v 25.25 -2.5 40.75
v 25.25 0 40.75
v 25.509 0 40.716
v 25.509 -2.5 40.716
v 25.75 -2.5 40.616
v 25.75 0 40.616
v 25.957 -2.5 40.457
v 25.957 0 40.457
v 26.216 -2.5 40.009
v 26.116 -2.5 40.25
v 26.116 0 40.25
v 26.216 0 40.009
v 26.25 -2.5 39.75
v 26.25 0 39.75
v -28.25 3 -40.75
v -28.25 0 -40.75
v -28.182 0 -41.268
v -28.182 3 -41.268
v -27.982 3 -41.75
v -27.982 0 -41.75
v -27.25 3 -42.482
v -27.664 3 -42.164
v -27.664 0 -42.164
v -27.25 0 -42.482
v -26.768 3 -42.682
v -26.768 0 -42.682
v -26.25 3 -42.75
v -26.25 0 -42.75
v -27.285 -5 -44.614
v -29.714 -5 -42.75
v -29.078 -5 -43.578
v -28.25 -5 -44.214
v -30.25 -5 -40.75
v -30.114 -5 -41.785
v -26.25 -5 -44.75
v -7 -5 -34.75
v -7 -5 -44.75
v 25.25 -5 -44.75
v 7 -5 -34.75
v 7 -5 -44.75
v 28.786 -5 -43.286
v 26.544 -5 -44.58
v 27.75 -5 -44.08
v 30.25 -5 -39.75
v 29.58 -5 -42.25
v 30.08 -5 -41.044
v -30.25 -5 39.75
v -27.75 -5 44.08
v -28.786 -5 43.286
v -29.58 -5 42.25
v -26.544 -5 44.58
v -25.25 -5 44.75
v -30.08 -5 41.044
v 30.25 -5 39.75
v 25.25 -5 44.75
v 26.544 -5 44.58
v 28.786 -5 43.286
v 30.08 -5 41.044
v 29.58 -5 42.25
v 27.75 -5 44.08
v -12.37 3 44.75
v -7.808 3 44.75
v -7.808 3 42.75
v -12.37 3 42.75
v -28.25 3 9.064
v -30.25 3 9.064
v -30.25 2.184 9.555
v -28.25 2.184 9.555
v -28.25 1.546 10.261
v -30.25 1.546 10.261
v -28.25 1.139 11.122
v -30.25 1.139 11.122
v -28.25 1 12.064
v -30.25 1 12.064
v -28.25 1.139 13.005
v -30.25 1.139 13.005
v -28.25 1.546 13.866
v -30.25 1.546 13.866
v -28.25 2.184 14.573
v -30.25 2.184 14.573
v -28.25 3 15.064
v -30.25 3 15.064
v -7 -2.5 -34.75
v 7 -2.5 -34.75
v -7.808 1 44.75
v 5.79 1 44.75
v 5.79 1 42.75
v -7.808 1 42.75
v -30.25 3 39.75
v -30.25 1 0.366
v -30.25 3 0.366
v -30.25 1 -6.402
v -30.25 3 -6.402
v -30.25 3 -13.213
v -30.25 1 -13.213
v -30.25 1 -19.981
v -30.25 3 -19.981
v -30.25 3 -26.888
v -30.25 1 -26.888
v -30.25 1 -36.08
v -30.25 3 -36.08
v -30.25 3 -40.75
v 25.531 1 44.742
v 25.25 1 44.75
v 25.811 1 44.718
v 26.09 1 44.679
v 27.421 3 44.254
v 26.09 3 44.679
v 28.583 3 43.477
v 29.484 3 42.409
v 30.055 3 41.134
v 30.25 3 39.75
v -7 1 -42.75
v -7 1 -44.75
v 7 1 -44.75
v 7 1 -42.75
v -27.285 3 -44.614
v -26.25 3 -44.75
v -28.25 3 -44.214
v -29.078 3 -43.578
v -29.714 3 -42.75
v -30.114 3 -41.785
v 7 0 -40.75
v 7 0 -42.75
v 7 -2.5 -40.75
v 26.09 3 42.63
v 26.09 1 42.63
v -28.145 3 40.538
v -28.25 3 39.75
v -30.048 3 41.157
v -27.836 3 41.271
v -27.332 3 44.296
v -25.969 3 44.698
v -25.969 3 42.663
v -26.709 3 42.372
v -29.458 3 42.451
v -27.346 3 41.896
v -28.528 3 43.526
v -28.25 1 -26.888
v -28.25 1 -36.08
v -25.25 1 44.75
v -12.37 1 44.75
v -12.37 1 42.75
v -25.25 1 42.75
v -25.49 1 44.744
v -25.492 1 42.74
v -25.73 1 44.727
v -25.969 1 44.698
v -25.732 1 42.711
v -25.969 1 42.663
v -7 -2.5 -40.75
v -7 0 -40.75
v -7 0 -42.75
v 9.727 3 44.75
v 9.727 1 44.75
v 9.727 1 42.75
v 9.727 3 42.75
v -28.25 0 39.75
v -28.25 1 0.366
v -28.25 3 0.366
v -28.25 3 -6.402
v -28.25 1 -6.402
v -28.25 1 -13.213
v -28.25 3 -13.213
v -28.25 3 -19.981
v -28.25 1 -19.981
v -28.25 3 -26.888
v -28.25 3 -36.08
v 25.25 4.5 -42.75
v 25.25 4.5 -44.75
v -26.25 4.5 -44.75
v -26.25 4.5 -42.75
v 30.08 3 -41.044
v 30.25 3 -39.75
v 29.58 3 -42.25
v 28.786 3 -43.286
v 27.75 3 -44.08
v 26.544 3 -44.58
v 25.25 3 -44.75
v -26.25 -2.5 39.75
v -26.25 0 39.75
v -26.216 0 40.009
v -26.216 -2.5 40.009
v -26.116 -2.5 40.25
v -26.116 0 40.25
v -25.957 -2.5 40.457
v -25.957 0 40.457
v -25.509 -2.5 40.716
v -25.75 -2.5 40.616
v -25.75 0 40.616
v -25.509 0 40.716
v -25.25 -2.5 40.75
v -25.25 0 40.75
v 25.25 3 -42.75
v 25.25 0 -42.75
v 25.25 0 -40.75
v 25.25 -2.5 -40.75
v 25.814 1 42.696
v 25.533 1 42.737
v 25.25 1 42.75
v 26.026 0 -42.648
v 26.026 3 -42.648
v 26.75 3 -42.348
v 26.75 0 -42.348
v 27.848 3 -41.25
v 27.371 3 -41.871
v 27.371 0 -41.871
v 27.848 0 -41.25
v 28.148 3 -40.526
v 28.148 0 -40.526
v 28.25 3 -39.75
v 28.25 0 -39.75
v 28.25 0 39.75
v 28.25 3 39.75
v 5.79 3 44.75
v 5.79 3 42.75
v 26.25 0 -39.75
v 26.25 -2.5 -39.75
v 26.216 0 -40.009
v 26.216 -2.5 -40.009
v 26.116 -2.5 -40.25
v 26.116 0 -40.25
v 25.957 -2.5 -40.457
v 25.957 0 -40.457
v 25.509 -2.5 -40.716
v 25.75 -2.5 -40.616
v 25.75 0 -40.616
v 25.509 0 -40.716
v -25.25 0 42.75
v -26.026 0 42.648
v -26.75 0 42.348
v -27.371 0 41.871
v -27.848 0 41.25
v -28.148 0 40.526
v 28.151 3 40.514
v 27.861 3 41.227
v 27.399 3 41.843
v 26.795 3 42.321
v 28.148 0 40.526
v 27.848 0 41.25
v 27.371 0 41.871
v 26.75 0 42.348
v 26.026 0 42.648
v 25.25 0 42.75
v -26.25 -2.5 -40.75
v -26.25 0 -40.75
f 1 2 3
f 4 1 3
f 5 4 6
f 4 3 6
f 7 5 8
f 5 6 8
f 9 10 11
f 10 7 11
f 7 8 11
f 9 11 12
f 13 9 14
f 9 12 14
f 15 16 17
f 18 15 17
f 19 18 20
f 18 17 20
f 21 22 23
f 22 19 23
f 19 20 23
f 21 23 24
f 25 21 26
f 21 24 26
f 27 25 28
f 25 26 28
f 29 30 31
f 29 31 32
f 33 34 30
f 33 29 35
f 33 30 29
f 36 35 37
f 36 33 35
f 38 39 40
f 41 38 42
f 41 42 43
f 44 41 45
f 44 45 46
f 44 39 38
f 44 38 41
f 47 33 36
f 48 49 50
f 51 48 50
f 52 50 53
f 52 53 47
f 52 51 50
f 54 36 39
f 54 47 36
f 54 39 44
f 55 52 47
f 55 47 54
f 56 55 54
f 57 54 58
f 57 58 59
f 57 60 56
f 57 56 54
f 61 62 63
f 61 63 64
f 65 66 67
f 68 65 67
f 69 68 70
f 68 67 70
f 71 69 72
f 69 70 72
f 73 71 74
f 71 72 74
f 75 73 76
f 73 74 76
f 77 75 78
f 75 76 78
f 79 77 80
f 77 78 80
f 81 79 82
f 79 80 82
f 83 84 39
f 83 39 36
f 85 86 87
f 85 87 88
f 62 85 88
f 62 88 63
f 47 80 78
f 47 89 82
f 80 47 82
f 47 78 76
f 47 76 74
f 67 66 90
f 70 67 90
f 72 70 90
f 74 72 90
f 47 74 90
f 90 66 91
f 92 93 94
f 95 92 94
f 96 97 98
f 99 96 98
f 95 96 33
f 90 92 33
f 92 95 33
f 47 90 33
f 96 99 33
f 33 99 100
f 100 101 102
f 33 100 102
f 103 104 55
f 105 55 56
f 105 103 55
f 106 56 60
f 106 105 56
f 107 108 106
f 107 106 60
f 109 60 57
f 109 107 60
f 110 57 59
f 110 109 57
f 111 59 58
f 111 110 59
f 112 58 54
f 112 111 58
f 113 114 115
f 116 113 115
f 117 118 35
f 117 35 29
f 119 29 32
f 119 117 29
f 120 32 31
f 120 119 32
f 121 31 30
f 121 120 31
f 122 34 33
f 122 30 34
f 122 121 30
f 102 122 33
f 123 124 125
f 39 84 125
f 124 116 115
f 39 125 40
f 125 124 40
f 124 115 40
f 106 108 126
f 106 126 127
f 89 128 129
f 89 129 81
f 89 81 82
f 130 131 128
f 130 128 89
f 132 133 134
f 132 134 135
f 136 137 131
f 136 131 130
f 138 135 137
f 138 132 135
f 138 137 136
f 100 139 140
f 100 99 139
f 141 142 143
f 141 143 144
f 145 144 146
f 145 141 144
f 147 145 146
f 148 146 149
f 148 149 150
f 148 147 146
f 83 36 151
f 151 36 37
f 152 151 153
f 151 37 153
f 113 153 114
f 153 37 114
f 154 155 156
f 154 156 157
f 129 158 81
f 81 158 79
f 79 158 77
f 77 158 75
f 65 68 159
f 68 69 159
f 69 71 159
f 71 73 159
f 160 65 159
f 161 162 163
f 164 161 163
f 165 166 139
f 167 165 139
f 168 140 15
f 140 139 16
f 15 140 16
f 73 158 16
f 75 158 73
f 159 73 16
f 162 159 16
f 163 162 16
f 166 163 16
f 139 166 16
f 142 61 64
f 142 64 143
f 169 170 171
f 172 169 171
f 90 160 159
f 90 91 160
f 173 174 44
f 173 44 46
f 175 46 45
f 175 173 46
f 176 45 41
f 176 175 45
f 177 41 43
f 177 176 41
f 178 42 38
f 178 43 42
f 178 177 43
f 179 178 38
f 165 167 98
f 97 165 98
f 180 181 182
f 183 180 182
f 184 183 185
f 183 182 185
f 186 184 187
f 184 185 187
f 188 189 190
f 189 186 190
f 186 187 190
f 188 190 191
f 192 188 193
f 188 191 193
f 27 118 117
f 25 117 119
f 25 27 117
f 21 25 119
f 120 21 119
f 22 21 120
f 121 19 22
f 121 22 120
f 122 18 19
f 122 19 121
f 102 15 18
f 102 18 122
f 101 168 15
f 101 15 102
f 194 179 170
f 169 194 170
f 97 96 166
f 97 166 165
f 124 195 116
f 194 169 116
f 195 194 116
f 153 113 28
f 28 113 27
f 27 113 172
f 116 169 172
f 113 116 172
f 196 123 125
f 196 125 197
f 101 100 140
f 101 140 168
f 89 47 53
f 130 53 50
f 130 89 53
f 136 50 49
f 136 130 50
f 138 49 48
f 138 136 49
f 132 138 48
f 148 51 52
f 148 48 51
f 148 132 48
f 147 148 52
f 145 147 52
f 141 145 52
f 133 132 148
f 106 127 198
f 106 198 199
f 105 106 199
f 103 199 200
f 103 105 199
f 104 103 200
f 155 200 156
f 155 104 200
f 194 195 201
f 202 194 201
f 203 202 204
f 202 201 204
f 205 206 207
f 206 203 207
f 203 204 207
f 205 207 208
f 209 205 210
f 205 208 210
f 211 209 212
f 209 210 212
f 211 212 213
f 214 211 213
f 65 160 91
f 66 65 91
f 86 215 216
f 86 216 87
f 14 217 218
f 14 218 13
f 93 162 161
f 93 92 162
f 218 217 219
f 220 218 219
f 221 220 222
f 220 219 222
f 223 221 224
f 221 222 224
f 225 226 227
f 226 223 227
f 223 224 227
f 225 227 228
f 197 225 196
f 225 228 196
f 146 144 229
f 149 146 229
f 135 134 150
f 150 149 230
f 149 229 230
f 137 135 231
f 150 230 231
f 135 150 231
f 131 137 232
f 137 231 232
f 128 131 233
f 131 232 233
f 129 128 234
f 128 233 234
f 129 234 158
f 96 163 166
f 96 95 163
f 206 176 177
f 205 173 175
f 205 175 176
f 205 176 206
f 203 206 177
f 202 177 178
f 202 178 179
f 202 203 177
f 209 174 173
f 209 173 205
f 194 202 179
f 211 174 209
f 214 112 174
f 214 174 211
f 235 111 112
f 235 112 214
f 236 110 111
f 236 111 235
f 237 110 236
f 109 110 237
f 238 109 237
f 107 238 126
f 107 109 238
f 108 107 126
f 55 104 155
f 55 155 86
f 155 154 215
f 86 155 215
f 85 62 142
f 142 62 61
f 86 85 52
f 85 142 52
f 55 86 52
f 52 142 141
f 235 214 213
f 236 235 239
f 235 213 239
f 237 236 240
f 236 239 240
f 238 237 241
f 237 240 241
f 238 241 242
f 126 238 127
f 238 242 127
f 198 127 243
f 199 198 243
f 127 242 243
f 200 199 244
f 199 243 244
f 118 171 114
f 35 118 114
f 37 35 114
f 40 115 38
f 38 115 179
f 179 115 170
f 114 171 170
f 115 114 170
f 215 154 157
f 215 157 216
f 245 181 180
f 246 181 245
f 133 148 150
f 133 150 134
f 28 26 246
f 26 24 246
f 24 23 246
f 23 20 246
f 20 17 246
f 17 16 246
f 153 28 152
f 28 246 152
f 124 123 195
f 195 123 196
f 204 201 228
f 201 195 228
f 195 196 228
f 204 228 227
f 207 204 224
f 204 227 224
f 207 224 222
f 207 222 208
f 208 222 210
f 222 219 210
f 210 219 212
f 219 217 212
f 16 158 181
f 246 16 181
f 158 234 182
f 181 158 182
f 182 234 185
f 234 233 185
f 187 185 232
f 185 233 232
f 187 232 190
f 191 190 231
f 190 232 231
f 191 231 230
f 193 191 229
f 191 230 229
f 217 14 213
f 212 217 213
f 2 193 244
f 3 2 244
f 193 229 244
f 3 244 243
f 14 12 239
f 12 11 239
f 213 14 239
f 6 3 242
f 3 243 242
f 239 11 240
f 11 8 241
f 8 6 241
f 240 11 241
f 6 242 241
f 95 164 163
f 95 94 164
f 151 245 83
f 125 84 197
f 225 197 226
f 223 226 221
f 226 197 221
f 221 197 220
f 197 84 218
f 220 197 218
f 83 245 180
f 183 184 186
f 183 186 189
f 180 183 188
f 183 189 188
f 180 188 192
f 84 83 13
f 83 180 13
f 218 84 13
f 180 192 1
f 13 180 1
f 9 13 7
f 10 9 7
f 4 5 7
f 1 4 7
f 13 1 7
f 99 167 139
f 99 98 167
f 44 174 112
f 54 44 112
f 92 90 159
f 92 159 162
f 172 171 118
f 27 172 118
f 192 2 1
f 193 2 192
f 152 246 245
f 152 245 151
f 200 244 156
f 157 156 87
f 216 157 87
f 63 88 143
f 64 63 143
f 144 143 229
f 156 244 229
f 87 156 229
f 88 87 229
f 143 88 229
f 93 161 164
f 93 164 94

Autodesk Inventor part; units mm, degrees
ref_plane "YZ Plane" through (0, 0, 0) normal (1, 0, 0) x (0, 1, 0)
ref_plane "XZ Plane" through (0, 0, 0) normal (0, 1, 0) x (-1, 0, 0)
ref_plane "XY Plane" through (0, 0, 0) normal (0, 0, 1) x (1, 0, 0)
sketch "Sketch1" plane through (0, 0, 0) normal (0, 1, 0) x (-1, 0, 0)
  line L0 (-25.25, 42.75) -> (25.25, 42.75)
  line L1 (28.25, 39.75) -> (28.25, -40.75)
  line L2 (26.25, -42.75) -> (-25.25, -42.75)
  line L3 (-28.25, -39.75) -> (-28.25, 39.75)
  line L4 (-28.25, 42.75) -> (28.25, -42.75) construction
  line L5 (28.25, 42.75) -> (-28.25, -42.75) construction
  arc A0 (26.25, -42.75) -> (28.25, -40.75) centre (26.25, -40.75) ccw
  arc A1 (-28.25, -39.75) -> (-25.25, -42.75) centre (-25.25, -39.75) ccw
  arc A2 (-25.25, 42.75) -> (-28.25, 39.75) centre (-25.25, 39.75) ccw
  arc A3 (28.25, 39.75) -> (25.25, 42.75) centre (25.25, 39.75) ccw
  line L6 (30.25, -40.75) -> (30.25, 39.75)
  arc A4 (30.25, 39.75) -> (25.25, 44.75) centre (25.25, 39.75) ccw
  line L7 (25.25, 44.75) -> (-25.25, 44.75)
  arc A5 (-25.25, 44.75) -> (-30.25, 39.75) centre (-25.25, 39.75) ccw
  line L8 (-30.25, 39.75) -> (-30.25, -39.75)
  arc A6 (-30.25, -39.75) -> (-25.25, -44.75) centre (-25.25, -39.75) ccw
  line L9 (-25.25, -44.75) -> (26.25, -44.75)
  arc A7 (26.25, -44.75) -> (30.25, -40.75) centre (26.25, -40.75) ccw
  point P0 (0, 0)
  dimension "d0" = 56.5
  dimension "d1" = 85.5
  dimension "d2" = 2
  dimension "d3" = 3
  dimension "d4" = 2
extrude "Extrusion1" add sketch "Sketch1" along normal blind 3
sketch "Sketch2" plane through (0, 0, 0) normal (0, -1, 0) x (1, 0, 0)
  arc A0 (-25.25, 44.75) -> (-30.25, 39.75) centre (-25.25, 39.75) ccw projected
  line L0 (-25.25, 44.75) -> (25.25, 44.75) projected
  arc A1 (30.25, 39.75) -> (25.25, 44.75) centre (25.25, 39.75) ccw projected
  line L1 (30.25, 39.75) -> (30.25, -39.75) projected
  arc A2 (25.25, -44.75) -> (30.25, -39.75) centre (25.25, -39.75) ccw projected
  line L2 (25.25, -44.75) -> (-26.25, -44.75) projected
  arc A3 (-30.25, -40.75) -> (-26.25, -44.75) centre (-26.25, -40.75) ccw projected
  line L3 (-30.25, -40.75) -> (-30.25, 39.75) projected
  line L4 (-26.25, -44.75) -> (25.25, -44.75)
  line L5 (30.25, -39.75) -> (30.25, 39.75)
  line L6 (25.25, 44.75) -> (-25.25, 44.75)
  line L7 (-30.25, 39.75) -> (-30.25, -40.75)
  line L8 (-30, -44.5) -> (30, 44.5) construction
  line L9 (30, -44.5) -> (-30, 44.5) construction
  arc A4 (-25.25, 44.75) -> (-30.25, 39.75) centre (-25.25, 39.75) ccw
  arc A5 (30.25, 39.75) -> (25.25, 44.75) centre (25.25, 39.75) ccw
  arc A6 (25.25, -42.75) -> (28.25, -39.75) centre (25.25, -39.75) ccw projected
  arc A7 (25.25, -44.75) -> (30.25, -39.75) centre (25.25, -39.75) ccw
  arc A8 (-30.25, -40.75) -> (-26.25, -44.75) centre (-26.25, -40.75) ccw
  line L10 (25.25, 40.75) -> (-25.25, 40.75)
  arc A9 (-25.25, 40.75) -> (-26.25, 39.75) centre (-25.25, 39.75) ccw
  line L11 (-26.25, 39.75) -> (-26.25, -40.75)
  line L12 (-26.25, -40.75) -> (25.25, -40.75)
  arc A10 (25.25, -40.75) -> (26.25, -39.75) centre (25.25, -39.75) ccw
  line L13 (26.25, -39.75) -> (26.25, 39.75)
  arc A11 (26.25, 39.75) -> (25.25, 40.75) centre (25.25, 39.75) ccw
  point P0 (0, 0)
  point P1 (-26.25, -40.75)
  dimension "d12" = 4
extrude "Extrusion2" add sketch "Sketch2" along normal blind 2.5
sketch "Sketch3" plane through (25.25, 3, -44.75) normal (0, 0, -1) x (-1, 0, 0)
  line L0 (51.5, -5.5) -> (51.5, 0) projected
  line L1 (51.5, 0) -> (0, 0)
  line L2 (0, 0) -> (0, 1.5)
  line L3 (0, 1.5) -> (51.5, 1.5)
  line L4 (51.5, 1.5) -> (51.5, 0)
  point P0 (25.25, -3)
  dimension "d9" = 1.5
extrude "Extrusion3" add sketch "Sketch3" against normal blind 2
sketch "Sketch4" plane through (0, -2.5, 0) normal (0, -1, 0) x (1, 0, 0)
  line L0 (25.25, 44.75) -> (-25.25, 44.75)
  line L1 (-30.25, 39.75) -> (-30.25, -40.75)
  line L2 (-26.25, -44.75) -> (25.25, -44.75)
  line L3 (30.25, -39.75) -> (30.25, 39.75)
  line L4 (30, 44.5) -> (-30, -44.5) construction
  line L5 (-30, 44.5) -> (30, -44.5) construction
  line L6 (-26.25, -44.75) -> (25.25, -44.75) projected
  line L7 (-30.25, 39.75) -> (-30.25, -40.75) projected
  arc A0 (25.25, -44.75) -> (30.25, -39.75) centre (25.25, -39.75) ccw projected
  arc A1 (-30.25, -40.75) -> (-26.25, -44.75) centre (-26.25, -40.75) ccw projected
  arc A2 (-25.25, 44.75) -> (-30.25, 39.75) centre (-25.25, 39.75) ccw projected
  arc A3 (30.25, 39.75) -> (25.25, 44.75) centre (25.25, 39.75) ccw projected
  arc A4 (25.25, -44.75) -> (30.25, -39.75) centre (25.25, -39.75) ccw
  line L8 (25.25, -40.75) -> (-26.25, -40.75) projected
  arc A5 (-30.25, -40.75) -> (-26.25, -44.75) centre (-26.25, -40.75) ccw
  arc A6 (-25.25, 44.75) -> (-30.25, 39.75) centre (-25.25, 39.75) ccw
  arc A7 (30.25, 39.75) -> (25.25, 44.75) centre (25.25, 39.75) ccw
  line L9 (25.25, 44.75) -> (-25.25, 44.75) projected
  point P0 (0, 0)
  point P1 (-30.25, 39.75)
  point P2 (-30.25, -40.75)
  point P3 (25.25, -44.75)
extrude "Extrusion4" add sketch "Sketch4" along normal blind 2.5
sketch "Sketch5" plane through (25.25, 4.5, -44.75) normal (0, 0, -1) x (-1, 0, 0)
  line L0 (51.5, -9.5) -> (0, -9.5) projected
  line L1 (18.25, -9.5) -> (32.25, -9.5)
  line L2 (32.25, -9.5) -> (32.25, -3.5)
  line L3 (32.25, -3.5) -> (18.25, -3.5)
  line L4 (18.25, -3.5) -> (18.25, -9.5)
  line L5 (18.25, -9.5) -> (32.25, -3.5) construction
  line L6 (32.25, -9.5) -> (18.25, -3.5) construction
  point P0 (25.25, -4.5)
  point P1 (25.25, -6.5)
  dimension "d16" = 14
  dimension "d17" = 0
  dimension "d18" = 6
extrude "Extrusion5" cut sketch "Sketch5" against normal blind 10
sketch "Sketch6" plane through (-30.25, 3, -40.75) normal (-1, 0, 0) x (0, 0, 1)
  line L0 (1, 0) -> (80.5, 0) projected
  line L1 (4.6696, 0) -> (13.8622, 0)
  line L2 (13.8622, 0) -> (13.8622, -2)
  line L3 (13.8622, -2) -> (4.6696, -2)
  line L4 (4.6696, -2) -> (4.6696, 0)
  line L5 (20.7687, 0) -> (27.5371, 0)
  line L6 (27.5371, 0) -> (27.5371, -2)
  line L7 (27.5371, -2) -> (20.7687, -2)
  line L8 (20.7687, -2) -> (20.7687, 0)
  line L9 (34.3481, 0) -> (41.1165, 0)
  line L10 (41.1165, 0) -> (41.1165, -2)
  line L11 (41.1165, -2) -> (34.3481, -2)
  line L12 (34.3481, -2) -> (34.3481, 0)
  arc A0 (49.8136, 0) -> (55.8136, 0) centre (52.8136, 1.25) ccw
  line L13 (-2, 1.5) -> (-2, 0) projected
  line L14 (80.5, -8) -> (0, -8) projected
  line L15 (49.8136, 0) -> (55.8136, 0)
  point P0 (40.75, -3)
  dimension "d21" = 6.6696
  dimension "d22" = 9.1926
  dimension "d23" = 22.7687
  dimension "d25" = 6.7684
  dimension "d26" = 6.7684
  dimension "d27" = 36.3481
  dimension "d28" = 51.8136
  dimension "d29" = 6
  dimension "d30" = 2
extrude "Extrusion6" cut sketch "Sketch6" against normal up to surface (2 mm away)
sketch "Sketch7" plane through (-25.25, 3, 44.75) normal (0, 0, 1) x (1, 0, 0)
  line L0 (50.5, 0) -> (0, 0) projected
  line L1 (-0.7188, 0) -> (12.8798, 0)
  line L2 (12.8798, 0) -> (12.8798, -2)
  line L3 (12.8798, -2) -> (-0.7188, -2)
  line L4 (-0.7188, -2) -> (-0.7188, 0)
  line L5 (17.4418, 0) -> (31.0404, 0)
  line L6 (31.0404, 0) -> (31.0404, -2)
  line L7 (31.0404, -2) -> (17.4418, -2)
  line L8 (17.4418, -2) -> (17.4418, 0)
  line L9 (34.977, 0) -> (51.34, 0)
  line L10 (51.34, 0) -> (51.34, -2)
  line L11 (51.34, -2) -> (34.977, -2)
  line L12 (34.977, -2) -> (34.977, 0)
  line L13 (-3, -3) -> (-3, 0) projected
  point P0 (25.25, -3)
  dimension "d33" = 2
  dimension "d34" = 2.2812
  dimension "d35" = 13.5986
  dimension "d36" = 20.4418
  dimension "d37" = 13.5986
  dimension "d38" = 37.977
  dimension "d39" = 16.363
extrude "Extrusion7" cut sketch "Sketch7" against normal blind 5
properties part number "piholder-proto-v5"
